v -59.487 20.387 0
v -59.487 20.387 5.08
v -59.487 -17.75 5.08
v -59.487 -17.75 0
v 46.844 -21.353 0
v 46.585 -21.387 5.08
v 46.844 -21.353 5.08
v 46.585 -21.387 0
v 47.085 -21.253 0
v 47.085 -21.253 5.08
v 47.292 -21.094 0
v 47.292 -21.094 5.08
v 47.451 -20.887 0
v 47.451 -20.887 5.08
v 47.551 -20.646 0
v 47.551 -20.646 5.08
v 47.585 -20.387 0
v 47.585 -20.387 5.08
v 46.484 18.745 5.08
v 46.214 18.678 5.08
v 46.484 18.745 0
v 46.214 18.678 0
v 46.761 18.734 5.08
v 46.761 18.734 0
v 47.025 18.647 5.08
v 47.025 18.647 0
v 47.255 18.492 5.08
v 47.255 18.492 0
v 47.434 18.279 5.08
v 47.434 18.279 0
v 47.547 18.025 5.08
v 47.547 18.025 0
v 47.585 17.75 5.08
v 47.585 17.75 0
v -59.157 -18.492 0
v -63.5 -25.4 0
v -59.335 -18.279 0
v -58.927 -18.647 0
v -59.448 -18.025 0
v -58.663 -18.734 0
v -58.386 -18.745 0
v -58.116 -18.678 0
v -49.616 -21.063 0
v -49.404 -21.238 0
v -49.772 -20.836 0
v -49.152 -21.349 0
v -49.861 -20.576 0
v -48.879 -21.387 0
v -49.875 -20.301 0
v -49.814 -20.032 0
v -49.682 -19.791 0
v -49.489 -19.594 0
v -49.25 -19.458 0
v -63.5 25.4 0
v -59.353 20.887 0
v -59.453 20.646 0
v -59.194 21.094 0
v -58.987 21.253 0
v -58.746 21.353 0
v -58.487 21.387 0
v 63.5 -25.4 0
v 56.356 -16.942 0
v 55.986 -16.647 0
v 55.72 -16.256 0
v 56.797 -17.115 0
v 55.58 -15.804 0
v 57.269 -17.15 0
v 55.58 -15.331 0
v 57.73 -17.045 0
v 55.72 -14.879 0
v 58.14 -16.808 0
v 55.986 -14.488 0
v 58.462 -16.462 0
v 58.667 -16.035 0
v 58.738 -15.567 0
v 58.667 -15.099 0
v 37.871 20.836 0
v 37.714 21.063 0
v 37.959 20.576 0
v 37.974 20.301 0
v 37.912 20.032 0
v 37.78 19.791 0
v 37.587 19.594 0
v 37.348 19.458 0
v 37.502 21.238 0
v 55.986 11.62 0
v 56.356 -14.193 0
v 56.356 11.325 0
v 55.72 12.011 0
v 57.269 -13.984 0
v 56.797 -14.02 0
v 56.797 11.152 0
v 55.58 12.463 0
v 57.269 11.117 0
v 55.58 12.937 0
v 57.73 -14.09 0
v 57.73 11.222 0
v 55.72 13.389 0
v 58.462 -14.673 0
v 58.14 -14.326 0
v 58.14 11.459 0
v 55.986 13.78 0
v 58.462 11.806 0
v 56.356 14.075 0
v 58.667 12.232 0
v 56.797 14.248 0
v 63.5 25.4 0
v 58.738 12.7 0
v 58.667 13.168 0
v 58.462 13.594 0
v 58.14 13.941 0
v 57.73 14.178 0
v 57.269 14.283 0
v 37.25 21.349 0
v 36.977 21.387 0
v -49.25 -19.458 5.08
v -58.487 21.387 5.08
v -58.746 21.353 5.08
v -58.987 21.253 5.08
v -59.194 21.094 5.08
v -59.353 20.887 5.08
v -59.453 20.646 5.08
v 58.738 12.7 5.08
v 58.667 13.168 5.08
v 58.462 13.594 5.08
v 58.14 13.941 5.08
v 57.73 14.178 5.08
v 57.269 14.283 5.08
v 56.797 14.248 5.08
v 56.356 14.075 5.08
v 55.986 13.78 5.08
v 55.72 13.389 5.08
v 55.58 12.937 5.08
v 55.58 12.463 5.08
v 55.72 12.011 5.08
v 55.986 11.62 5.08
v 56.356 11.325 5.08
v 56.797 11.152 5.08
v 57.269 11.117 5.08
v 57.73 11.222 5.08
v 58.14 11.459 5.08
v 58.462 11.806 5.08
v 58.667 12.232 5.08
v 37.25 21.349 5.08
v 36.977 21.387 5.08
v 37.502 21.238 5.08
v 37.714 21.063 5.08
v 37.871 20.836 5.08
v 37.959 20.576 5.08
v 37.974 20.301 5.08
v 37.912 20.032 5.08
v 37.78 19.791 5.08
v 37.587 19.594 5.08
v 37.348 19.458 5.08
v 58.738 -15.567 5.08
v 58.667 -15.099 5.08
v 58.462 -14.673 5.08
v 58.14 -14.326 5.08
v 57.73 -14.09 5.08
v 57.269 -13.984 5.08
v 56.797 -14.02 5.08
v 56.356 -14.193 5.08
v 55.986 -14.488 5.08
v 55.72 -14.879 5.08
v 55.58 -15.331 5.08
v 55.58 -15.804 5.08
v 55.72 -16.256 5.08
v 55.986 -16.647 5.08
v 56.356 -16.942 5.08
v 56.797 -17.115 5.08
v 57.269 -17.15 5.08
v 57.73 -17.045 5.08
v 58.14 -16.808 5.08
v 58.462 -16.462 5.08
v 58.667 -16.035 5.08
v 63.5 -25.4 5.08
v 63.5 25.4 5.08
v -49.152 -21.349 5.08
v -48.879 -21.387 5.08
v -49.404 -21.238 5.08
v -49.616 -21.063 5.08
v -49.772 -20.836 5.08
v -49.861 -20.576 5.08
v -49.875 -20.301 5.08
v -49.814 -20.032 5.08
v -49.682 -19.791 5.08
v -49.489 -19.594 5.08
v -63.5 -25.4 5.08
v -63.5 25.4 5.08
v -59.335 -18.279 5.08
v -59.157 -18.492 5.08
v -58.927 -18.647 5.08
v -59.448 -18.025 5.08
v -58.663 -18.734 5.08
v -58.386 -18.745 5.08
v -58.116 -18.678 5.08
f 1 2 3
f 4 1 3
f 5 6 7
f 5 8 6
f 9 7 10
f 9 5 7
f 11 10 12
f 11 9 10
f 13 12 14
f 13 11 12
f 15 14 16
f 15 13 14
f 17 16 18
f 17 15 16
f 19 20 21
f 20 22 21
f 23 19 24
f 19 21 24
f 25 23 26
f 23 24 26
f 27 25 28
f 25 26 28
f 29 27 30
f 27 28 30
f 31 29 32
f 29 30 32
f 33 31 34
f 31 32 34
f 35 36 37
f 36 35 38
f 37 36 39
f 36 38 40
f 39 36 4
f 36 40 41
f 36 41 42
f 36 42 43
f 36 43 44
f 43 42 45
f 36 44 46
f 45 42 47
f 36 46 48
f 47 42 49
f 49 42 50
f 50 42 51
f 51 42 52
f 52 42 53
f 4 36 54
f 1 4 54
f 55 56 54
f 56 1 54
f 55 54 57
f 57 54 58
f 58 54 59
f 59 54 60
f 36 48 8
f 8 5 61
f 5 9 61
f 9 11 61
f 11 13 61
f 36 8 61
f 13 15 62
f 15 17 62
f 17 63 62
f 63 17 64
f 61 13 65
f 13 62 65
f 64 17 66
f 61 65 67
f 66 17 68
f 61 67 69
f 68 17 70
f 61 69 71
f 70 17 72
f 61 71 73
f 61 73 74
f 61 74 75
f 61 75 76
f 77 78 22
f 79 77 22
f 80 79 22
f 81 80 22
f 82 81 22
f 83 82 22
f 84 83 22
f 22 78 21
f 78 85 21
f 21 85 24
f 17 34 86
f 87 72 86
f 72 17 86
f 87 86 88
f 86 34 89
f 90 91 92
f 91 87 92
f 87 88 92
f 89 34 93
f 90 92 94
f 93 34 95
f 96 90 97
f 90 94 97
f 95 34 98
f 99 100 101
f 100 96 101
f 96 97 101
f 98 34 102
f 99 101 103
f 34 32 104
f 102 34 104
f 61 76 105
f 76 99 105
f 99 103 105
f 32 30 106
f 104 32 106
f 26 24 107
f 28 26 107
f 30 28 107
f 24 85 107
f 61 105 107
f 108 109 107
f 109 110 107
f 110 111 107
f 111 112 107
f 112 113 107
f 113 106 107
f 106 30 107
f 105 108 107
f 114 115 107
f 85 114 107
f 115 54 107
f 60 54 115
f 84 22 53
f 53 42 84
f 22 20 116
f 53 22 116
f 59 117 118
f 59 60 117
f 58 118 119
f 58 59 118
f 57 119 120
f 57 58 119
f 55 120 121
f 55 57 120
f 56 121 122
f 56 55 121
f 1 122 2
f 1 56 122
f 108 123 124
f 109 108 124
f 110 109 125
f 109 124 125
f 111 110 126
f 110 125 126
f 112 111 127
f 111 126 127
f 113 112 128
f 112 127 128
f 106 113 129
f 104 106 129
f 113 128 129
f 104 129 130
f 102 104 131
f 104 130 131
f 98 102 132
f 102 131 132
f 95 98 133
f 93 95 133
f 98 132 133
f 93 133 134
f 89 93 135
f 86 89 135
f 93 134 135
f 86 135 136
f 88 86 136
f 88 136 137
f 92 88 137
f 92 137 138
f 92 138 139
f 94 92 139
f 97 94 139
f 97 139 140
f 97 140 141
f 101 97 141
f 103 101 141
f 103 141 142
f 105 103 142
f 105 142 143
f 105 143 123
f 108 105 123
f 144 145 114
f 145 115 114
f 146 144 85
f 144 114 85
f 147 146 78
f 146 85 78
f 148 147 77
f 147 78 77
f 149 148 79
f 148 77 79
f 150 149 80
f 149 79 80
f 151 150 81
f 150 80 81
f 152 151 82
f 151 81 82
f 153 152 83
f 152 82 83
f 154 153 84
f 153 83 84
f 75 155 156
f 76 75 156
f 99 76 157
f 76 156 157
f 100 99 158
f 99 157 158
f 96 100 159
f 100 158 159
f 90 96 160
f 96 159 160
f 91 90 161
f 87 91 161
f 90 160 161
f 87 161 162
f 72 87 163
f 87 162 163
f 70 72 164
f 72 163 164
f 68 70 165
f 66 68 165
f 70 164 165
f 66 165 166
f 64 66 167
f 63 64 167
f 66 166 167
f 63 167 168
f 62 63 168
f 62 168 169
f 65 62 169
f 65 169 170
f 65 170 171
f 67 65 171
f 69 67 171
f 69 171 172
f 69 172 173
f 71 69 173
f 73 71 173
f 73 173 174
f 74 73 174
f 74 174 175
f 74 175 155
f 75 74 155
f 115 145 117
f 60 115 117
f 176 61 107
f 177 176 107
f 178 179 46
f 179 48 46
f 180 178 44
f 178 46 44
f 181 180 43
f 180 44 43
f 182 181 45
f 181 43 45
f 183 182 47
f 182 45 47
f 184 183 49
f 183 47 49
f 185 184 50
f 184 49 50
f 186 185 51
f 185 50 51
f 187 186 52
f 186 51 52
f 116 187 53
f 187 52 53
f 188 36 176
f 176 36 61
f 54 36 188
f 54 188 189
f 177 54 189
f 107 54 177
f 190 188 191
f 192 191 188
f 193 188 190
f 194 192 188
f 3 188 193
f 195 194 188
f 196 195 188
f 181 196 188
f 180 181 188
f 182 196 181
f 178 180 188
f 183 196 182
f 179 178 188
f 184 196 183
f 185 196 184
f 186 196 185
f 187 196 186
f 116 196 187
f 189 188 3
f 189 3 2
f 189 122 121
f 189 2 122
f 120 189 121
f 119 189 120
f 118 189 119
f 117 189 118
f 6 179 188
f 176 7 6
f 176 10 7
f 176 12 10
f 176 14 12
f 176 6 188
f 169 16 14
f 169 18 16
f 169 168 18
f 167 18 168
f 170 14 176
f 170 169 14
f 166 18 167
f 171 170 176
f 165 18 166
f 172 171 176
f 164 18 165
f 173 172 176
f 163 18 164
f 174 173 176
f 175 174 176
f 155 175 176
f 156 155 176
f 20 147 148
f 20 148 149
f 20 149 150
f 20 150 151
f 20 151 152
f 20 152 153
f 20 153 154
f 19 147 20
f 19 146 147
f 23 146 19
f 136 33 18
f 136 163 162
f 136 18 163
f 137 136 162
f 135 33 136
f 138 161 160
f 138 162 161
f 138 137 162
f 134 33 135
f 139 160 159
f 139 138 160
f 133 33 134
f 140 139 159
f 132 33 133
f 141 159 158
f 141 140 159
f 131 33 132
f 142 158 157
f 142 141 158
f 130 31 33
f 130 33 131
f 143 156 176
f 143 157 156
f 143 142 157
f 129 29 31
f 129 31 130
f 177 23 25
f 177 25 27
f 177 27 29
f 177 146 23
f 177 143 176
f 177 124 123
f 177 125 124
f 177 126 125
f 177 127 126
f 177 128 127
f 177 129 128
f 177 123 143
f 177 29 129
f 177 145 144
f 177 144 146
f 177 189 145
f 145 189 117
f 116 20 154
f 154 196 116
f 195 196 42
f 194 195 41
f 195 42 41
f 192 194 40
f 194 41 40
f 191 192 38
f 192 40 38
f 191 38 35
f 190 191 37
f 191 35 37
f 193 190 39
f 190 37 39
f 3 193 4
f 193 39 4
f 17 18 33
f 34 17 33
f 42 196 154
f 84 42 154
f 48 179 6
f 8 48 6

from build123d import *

# Parameters (mm, degrees)
SKETCH_W     = 127
SKETCH_H     = 50.8
PAD_DEPTH    = 5.08
SKETCH001_R  = 1.5875
POCKET_DEPTH = 5.081
FILLET_R     = 0.999998
FILLET001_R  = 0.999998
FILLET002_R  = 0.999998


with BuildPart() as part:
    # Sketch → Pad (new body)
    with BuildSketch(Plane.XY):
        Rectangle(SKETCH_W, SKETCH_H)
    extrude(amount=PAD_DEPTH)

    # Sketch001 (on Face6 of Pad) → Pocket (cut, through all)
    with BuildSketch(Plane.XY.offset(5.08)):
        with Locations((57.15, 12.7)):
            Circle(SKETCH001_R)
        with Locations((57.15, -15.567334)):
            Circle(SKETCH001_R)
        Polygon((-54.077858, -21.3868), (47.585089, -21.3868), (47.585089, 19.226009), align=None)
        Polygon((42.176147, 21.3868), (-59.4868, 21.3868), (-59.4868, -19.226009), align=None)
    extrude(amount=-POCKET_DEPTH, mode=Mode.SUBTRACT)

    # Fillet
    fillet_edges = [part.edges().sort_by_distance(p)[0] for p in [
        (-59.4868, 21.3868, 2.54),
        (47.585089, -21.3868, 2.54),
    ]]
    fillet(fillet_edges, radius=FILLET_R)

    # Fillet001
    fillet001_edges = [part.edges().sort_by_distance(p)[0] for p in [
        (-54.077858, -21.3868, 2.54),
        (42.176147, 21.3868, 2.54),
    ]]
    fillet(fillet001_edges, radius=FILLET001_R)

    # Fillet002
    fillet002_edges = [part.edges().sort_by_distance(p)[0] for p in [
        (47.585089, 19.226009, 2.54),
        (-59.4868, -19.226009, 2.54),
    ]]
    fillet(fillet002_edges, radius=FILLET002_R)


solid = part.part
